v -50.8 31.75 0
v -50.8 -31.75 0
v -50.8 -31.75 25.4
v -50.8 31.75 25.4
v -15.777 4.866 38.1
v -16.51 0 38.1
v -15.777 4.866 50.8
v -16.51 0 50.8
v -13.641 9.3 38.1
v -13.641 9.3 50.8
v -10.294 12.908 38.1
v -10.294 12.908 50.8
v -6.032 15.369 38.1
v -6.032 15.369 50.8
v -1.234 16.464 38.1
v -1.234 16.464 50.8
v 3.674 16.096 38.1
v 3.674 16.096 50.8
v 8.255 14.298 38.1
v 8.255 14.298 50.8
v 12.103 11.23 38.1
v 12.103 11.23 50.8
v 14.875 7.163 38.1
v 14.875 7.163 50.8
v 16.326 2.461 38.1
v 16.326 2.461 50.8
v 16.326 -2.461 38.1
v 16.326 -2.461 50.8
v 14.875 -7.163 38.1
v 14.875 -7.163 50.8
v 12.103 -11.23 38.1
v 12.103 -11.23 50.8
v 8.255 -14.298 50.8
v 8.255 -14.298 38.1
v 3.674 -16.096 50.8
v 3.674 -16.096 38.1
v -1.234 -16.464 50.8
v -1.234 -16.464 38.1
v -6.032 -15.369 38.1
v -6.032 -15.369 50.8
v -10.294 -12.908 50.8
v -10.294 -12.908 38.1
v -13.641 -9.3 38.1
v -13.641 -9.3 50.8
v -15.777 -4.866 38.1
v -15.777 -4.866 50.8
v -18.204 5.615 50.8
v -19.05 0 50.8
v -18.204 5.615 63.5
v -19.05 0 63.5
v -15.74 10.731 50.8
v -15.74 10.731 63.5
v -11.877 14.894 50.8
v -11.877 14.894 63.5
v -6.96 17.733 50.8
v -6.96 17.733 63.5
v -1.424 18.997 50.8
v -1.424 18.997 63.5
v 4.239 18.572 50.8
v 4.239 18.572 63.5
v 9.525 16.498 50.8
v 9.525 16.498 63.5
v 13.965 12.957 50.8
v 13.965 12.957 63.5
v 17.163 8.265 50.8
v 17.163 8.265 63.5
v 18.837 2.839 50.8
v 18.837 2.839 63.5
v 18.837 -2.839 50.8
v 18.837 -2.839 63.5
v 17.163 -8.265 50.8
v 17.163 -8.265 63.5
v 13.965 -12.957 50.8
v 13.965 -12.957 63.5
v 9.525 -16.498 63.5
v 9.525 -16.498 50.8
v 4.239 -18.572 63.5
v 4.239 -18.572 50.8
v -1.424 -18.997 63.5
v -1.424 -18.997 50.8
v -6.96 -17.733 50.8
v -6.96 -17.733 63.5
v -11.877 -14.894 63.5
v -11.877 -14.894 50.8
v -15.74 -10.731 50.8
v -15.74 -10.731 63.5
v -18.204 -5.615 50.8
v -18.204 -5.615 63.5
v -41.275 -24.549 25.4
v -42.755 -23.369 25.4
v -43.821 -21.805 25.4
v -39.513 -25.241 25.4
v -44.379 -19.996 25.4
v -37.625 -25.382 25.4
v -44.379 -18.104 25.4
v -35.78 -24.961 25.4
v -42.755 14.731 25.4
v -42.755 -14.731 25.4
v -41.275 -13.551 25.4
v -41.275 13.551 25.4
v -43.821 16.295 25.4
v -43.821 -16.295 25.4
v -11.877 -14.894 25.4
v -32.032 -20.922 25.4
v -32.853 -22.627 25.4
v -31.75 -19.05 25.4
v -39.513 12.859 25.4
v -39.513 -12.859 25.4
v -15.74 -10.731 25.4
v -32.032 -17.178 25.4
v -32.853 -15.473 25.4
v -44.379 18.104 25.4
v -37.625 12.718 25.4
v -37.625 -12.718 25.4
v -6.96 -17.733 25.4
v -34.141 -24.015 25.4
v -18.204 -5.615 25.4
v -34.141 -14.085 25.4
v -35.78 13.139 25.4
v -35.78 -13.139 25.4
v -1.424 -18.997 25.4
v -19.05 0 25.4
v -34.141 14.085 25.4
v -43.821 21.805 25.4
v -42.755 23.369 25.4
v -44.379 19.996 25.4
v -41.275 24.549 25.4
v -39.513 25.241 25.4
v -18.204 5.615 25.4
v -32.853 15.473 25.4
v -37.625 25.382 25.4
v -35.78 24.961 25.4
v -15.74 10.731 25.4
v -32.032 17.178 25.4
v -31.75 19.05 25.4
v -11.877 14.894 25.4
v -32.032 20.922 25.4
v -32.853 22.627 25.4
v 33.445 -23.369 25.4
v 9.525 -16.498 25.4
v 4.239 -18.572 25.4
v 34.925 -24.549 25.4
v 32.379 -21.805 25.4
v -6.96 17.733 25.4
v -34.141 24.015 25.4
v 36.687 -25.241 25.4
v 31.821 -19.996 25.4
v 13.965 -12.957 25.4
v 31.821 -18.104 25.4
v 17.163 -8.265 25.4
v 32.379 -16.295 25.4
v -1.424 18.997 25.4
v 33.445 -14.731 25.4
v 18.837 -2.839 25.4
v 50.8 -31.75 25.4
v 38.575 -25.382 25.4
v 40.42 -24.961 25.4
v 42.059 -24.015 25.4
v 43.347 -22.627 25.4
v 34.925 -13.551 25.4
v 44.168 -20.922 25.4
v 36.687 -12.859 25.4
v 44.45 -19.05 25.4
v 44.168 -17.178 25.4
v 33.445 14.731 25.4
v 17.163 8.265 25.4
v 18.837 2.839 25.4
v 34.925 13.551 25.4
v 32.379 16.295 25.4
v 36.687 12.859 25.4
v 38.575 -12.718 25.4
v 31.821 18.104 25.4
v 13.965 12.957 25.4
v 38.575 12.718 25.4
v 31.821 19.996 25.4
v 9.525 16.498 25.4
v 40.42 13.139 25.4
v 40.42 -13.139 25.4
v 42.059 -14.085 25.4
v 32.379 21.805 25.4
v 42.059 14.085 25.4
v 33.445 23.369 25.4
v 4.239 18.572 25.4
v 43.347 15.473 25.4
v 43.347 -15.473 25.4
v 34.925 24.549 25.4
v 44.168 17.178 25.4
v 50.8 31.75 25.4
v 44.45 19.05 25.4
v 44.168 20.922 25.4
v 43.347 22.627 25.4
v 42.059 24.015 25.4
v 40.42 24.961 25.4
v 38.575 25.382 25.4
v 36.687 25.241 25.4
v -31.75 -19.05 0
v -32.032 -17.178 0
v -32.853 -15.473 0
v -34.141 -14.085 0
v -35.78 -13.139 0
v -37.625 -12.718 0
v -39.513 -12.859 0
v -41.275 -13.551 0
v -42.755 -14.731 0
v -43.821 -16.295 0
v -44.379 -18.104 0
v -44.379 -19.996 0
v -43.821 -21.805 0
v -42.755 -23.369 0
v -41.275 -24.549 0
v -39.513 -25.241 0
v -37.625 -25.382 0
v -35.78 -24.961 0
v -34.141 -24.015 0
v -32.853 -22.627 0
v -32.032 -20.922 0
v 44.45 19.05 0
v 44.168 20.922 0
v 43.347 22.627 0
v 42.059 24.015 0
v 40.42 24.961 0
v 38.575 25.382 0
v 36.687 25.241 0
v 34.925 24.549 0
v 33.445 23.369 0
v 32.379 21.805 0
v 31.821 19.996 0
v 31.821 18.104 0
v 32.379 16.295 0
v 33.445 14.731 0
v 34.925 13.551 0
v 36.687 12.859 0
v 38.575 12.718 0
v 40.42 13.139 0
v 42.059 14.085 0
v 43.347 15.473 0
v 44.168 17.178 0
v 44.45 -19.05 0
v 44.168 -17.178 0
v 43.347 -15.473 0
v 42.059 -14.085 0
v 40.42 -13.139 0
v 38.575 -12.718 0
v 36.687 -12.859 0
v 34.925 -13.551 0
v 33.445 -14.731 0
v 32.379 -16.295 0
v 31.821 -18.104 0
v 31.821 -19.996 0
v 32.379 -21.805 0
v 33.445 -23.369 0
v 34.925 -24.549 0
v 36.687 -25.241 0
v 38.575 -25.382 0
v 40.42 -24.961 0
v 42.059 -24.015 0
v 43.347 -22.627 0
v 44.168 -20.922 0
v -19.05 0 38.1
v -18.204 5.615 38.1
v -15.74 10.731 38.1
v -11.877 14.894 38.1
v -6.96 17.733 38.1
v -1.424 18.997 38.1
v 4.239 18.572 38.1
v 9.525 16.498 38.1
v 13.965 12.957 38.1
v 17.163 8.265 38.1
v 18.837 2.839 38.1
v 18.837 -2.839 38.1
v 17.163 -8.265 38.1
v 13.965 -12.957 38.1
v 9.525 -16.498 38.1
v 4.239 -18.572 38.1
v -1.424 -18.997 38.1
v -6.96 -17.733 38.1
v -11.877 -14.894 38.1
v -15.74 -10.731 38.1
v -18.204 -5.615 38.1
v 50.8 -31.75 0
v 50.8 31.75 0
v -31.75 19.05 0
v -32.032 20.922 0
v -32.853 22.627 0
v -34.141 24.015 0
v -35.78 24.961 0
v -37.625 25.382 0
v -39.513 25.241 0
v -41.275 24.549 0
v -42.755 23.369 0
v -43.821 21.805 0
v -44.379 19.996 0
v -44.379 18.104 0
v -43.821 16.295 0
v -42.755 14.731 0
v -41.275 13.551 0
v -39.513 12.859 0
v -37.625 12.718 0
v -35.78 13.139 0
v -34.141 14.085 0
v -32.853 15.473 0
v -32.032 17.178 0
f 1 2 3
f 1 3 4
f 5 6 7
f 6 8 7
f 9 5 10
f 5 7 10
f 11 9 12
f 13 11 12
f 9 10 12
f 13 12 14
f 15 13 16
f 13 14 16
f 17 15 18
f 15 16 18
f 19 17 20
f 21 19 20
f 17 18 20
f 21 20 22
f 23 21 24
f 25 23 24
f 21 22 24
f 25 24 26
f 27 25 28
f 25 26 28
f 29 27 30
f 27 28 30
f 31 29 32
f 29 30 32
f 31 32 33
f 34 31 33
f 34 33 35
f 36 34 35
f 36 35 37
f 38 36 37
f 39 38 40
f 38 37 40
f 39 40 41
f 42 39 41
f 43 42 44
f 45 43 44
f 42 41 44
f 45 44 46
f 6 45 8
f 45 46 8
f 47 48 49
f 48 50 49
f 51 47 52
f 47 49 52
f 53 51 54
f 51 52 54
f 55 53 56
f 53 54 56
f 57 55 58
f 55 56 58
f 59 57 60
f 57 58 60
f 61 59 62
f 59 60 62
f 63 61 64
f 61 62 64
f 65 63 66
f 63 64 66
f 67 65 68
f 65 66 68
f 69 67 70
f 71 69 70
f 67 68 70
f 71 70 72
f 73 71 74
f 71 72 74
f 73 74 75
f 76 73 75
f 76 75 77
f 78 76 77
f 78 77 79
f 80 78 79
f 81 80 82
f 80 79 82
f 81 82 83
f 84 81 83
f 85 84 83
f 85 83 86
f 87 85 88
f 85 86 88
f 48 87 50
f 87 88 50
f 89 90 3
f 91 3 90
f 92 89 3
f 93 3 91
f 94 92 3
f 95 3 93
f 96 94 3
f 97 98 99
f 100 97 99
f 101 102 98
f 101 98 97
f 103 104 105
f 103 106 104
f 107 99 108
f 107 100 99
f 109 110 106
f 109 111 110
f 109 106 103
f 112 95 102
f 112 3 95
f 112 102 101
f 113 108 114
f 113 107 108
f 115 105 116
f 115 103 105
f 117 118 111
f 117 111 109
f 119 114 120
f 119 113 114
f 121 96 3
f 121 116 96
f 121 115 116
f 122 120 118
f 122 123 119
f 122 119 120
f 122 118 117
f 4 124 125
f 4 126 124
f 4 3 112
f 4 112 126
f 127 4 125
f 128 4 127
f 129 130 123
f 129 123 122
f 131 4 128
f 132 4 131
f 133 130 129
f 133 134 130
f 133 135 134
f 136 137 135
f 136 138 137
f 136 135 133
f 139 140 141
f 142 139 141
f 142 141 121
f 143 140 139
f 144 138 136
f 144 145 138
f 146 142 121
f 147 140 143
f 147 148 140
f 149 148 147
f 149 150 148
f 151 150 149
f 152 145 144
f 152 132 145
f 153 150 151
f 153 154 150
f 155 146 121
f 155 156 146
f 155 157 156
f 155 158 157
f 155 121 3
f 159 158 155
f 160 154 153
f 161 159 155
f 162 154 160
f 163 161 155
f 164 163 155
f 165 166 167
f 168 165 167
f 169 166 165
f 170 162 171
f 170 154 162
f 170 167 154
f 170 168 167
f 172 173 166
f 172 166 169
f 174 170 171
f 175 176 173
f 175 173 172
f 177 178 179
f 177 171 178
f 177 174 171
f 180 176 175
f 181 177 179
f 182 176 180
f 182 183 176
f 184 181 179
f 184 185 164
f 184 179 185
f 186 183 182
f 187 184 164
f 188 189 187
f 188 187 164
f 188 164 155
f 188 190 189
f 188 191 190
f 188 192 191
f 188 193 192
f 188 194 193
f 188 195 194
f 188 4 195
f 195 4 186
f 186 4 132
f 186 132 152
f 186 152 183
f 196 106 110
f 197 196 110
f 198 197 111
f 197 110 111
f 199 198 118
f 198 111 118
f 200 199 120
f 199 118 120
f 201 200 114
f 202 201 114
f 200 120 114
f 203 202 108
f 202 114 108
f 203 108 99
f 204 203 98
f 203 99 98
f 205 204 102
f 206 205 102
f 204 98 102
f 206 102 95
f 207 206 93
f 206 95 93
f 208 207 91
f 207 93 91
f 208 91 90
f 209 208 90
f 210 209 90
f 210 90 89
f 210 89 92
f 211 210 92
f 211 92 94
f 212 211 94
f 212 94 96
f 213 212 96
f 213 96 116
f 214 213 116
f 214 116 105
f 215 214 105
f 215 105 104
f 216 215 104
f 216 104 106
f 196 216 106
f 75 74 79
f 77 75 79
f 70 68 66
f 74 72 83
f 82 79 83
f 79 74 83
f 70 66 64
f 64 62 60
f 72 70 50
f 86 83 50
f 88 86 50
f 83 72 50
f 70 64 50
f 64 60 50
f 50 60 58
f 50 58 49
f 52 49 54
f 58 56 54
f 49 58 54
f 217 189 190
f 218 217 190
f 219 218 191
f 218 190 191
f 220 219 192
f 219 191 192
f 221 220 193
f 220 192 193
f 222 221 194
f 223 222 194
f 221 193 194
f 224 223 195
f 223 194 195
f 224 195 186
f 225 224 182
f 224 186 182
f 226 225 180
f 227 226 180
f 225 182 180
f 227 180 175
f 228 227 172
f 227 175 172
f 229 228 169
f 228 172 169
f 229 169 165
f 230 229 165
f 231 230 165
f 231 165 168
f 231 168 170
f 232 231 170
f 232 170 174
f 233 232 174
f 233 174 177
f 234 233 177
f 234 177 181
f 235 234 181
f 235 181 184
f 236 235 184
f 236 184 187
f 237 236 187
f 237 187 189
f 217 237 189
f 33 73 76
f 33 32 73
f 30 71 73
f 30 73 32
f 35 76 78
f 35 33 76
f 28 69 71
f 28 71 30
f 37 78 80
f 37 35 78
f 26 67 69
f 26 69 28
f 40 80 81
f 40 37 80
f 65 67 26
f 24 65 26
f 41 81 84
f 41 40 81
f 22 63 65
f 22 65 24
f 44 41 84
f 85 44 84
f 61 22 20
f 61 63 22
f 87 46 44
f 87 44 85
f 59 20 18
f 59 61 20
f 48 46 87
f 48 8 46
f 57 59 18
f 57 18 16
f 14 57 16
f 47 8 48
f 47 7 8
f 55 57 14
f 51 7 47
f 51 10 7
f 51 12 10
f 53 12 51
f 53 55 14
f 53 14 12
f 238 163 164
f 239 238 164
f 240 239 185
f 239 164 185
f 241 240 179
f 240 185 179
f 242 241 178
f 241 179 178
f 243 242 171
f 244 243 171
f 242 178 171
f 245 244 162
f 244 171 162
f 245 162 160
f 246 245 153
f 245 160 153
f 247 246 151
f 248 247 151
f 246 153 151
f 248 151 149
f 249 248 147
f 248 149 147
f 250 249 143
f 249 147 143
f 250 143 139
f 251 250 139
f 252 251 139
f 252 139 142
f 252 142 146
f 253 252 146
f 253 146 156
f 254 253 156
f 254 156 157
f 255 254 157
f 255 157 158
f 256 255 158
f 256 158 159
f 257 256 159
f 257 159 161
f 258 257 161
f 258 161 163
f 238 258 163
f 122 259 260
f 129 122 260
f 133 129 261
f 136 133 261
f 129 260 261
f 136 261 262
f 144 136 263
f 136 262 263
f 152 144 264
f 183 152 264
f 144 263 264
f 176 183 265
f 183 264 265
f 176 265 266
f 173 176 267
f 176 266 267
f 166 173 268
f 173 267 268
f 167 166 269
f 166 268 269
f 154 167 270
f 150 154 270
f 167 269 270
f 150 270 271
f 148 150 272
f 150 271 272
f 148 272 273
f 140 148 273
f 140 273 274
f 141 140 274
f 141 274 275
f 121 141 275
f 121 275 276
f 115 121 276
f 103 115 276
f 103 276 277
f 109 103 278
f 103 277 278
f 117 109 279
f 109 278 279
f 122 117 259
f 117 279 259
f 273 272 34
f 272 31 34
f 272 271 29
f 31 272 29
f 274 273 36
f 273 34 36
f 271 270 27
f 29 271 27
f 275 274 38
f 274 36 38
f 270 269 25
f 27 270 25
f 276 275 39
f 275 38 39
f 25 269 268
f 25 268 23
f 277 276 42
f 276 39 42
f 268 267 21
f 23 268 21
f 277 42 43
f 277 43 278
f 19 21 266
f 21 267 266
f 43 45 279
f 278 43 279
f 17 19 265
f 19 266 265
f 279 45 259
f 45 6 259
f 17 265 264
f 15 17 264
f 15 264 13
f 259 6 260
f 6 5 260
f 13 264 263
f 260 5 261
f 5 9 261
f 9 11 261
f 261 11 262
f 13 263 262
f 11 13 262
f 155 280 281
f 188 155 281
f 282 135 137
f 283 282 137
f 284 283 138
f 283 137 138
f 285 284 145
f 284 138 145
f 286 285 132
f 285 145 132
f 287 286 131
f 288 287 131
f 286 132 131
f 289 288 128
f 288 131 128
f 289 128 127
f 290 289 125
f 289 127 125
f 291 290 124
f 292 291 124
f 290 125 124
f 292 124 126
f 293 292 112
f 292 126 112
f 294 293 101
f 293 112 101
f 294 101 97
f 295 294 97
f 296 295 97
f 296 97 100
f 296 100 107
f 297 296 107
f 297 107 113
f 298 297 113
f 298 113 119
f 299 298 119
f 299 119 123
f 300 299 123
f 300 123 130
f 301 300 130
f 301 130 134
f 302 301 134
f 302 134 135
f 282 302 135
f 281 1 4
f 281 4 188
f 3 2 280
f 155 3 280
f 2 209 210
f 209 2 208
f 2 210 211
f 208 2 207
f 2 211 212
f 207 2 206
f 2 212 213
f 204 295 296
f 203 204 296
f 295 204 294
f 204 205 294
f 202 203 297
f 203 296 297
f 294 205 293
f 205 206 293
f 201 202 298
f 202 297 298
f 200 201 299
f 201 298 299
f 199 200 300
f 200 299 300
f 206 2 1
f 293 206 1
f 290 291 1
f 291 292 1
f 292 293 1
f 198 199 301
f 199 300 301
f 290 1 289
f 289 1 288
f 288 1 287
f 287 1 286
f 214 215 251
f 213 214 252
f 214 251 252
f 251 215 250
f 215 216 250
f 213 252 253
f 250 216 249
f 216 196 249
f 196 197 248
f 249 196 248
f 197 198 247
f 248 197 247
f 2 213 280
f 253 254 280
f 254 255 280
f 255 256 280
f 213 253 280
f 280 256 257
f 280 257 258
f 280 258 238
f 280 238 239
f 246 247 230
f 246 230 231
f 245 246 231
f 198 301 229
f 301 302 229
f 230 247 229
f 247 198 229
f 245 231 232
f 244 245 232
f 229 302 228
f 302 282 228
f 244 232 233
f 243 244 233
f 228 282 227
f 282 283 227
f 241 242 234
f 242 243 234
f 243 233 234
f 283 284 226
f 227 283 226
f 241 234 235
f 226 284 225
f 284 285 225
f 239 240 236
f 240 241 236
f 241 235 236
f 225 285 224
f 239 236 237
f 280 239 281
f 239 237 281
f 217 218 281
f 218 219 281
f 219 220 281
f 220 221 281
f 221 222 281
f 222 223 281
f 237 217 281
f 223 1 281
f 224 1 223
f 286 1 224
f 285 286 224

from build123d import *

# Parameters (mm, degrees)
F0_W     = 101.6
F0_H     = 63.5
F1_DEPTH = 25.4
F2_R     = 6.35
F3_DEPTH = 25.401
F4_W     = 19.05
F4_H     = 38.1
F6_W     = 2.54
F6_H     = 12.7


with BuildPart() as f1:
    # F0 (on Top) → F1 (new body)
    with BuildSketch(Plane.XY):
        Rectangle(F0_W, F0_H)
    extrude(amount=F1_DEPTH)

    # F2 (on face) → F3 (cut, through all)
    with BuildSketch(Plane.XY.offset(25.4)):
        with Locations((-38.1, 19.05)):
            Circle(F2_R)
        with Locations((-38.1, -19.05)):
            Circle(F2_R)
        with Locations((38.1, 19.05)):
            Circle(F2_R)
        with Locations((38.1, -19.05)):
            Circle(F2_R)
    extrude(amount=-F3_DEPTH, mode=Mode.SUBTRACT)

    # F4 (on Front) → F5 (revolve)
    with BuildSketch(Plane.XZ):
        with Locations((-9.525, 44.45)):
            Rectangle(F4_W, F4_H)
    revolve(axis=Axis((0, 0, 44.45), (0, 0, -1)))

    # F6 (on Front) → F8 (revolve, cut)
    with BuildSketch(Plane.XZ):
        with Locations((-17.78, 44.45)):
            Rectangle(F6_W, F6_H)
    revolve(axis=Axis((0, 0, 44.295382), (0, 0, -1)), mode=Mode.SUBTRACT)


solid = f1.part
